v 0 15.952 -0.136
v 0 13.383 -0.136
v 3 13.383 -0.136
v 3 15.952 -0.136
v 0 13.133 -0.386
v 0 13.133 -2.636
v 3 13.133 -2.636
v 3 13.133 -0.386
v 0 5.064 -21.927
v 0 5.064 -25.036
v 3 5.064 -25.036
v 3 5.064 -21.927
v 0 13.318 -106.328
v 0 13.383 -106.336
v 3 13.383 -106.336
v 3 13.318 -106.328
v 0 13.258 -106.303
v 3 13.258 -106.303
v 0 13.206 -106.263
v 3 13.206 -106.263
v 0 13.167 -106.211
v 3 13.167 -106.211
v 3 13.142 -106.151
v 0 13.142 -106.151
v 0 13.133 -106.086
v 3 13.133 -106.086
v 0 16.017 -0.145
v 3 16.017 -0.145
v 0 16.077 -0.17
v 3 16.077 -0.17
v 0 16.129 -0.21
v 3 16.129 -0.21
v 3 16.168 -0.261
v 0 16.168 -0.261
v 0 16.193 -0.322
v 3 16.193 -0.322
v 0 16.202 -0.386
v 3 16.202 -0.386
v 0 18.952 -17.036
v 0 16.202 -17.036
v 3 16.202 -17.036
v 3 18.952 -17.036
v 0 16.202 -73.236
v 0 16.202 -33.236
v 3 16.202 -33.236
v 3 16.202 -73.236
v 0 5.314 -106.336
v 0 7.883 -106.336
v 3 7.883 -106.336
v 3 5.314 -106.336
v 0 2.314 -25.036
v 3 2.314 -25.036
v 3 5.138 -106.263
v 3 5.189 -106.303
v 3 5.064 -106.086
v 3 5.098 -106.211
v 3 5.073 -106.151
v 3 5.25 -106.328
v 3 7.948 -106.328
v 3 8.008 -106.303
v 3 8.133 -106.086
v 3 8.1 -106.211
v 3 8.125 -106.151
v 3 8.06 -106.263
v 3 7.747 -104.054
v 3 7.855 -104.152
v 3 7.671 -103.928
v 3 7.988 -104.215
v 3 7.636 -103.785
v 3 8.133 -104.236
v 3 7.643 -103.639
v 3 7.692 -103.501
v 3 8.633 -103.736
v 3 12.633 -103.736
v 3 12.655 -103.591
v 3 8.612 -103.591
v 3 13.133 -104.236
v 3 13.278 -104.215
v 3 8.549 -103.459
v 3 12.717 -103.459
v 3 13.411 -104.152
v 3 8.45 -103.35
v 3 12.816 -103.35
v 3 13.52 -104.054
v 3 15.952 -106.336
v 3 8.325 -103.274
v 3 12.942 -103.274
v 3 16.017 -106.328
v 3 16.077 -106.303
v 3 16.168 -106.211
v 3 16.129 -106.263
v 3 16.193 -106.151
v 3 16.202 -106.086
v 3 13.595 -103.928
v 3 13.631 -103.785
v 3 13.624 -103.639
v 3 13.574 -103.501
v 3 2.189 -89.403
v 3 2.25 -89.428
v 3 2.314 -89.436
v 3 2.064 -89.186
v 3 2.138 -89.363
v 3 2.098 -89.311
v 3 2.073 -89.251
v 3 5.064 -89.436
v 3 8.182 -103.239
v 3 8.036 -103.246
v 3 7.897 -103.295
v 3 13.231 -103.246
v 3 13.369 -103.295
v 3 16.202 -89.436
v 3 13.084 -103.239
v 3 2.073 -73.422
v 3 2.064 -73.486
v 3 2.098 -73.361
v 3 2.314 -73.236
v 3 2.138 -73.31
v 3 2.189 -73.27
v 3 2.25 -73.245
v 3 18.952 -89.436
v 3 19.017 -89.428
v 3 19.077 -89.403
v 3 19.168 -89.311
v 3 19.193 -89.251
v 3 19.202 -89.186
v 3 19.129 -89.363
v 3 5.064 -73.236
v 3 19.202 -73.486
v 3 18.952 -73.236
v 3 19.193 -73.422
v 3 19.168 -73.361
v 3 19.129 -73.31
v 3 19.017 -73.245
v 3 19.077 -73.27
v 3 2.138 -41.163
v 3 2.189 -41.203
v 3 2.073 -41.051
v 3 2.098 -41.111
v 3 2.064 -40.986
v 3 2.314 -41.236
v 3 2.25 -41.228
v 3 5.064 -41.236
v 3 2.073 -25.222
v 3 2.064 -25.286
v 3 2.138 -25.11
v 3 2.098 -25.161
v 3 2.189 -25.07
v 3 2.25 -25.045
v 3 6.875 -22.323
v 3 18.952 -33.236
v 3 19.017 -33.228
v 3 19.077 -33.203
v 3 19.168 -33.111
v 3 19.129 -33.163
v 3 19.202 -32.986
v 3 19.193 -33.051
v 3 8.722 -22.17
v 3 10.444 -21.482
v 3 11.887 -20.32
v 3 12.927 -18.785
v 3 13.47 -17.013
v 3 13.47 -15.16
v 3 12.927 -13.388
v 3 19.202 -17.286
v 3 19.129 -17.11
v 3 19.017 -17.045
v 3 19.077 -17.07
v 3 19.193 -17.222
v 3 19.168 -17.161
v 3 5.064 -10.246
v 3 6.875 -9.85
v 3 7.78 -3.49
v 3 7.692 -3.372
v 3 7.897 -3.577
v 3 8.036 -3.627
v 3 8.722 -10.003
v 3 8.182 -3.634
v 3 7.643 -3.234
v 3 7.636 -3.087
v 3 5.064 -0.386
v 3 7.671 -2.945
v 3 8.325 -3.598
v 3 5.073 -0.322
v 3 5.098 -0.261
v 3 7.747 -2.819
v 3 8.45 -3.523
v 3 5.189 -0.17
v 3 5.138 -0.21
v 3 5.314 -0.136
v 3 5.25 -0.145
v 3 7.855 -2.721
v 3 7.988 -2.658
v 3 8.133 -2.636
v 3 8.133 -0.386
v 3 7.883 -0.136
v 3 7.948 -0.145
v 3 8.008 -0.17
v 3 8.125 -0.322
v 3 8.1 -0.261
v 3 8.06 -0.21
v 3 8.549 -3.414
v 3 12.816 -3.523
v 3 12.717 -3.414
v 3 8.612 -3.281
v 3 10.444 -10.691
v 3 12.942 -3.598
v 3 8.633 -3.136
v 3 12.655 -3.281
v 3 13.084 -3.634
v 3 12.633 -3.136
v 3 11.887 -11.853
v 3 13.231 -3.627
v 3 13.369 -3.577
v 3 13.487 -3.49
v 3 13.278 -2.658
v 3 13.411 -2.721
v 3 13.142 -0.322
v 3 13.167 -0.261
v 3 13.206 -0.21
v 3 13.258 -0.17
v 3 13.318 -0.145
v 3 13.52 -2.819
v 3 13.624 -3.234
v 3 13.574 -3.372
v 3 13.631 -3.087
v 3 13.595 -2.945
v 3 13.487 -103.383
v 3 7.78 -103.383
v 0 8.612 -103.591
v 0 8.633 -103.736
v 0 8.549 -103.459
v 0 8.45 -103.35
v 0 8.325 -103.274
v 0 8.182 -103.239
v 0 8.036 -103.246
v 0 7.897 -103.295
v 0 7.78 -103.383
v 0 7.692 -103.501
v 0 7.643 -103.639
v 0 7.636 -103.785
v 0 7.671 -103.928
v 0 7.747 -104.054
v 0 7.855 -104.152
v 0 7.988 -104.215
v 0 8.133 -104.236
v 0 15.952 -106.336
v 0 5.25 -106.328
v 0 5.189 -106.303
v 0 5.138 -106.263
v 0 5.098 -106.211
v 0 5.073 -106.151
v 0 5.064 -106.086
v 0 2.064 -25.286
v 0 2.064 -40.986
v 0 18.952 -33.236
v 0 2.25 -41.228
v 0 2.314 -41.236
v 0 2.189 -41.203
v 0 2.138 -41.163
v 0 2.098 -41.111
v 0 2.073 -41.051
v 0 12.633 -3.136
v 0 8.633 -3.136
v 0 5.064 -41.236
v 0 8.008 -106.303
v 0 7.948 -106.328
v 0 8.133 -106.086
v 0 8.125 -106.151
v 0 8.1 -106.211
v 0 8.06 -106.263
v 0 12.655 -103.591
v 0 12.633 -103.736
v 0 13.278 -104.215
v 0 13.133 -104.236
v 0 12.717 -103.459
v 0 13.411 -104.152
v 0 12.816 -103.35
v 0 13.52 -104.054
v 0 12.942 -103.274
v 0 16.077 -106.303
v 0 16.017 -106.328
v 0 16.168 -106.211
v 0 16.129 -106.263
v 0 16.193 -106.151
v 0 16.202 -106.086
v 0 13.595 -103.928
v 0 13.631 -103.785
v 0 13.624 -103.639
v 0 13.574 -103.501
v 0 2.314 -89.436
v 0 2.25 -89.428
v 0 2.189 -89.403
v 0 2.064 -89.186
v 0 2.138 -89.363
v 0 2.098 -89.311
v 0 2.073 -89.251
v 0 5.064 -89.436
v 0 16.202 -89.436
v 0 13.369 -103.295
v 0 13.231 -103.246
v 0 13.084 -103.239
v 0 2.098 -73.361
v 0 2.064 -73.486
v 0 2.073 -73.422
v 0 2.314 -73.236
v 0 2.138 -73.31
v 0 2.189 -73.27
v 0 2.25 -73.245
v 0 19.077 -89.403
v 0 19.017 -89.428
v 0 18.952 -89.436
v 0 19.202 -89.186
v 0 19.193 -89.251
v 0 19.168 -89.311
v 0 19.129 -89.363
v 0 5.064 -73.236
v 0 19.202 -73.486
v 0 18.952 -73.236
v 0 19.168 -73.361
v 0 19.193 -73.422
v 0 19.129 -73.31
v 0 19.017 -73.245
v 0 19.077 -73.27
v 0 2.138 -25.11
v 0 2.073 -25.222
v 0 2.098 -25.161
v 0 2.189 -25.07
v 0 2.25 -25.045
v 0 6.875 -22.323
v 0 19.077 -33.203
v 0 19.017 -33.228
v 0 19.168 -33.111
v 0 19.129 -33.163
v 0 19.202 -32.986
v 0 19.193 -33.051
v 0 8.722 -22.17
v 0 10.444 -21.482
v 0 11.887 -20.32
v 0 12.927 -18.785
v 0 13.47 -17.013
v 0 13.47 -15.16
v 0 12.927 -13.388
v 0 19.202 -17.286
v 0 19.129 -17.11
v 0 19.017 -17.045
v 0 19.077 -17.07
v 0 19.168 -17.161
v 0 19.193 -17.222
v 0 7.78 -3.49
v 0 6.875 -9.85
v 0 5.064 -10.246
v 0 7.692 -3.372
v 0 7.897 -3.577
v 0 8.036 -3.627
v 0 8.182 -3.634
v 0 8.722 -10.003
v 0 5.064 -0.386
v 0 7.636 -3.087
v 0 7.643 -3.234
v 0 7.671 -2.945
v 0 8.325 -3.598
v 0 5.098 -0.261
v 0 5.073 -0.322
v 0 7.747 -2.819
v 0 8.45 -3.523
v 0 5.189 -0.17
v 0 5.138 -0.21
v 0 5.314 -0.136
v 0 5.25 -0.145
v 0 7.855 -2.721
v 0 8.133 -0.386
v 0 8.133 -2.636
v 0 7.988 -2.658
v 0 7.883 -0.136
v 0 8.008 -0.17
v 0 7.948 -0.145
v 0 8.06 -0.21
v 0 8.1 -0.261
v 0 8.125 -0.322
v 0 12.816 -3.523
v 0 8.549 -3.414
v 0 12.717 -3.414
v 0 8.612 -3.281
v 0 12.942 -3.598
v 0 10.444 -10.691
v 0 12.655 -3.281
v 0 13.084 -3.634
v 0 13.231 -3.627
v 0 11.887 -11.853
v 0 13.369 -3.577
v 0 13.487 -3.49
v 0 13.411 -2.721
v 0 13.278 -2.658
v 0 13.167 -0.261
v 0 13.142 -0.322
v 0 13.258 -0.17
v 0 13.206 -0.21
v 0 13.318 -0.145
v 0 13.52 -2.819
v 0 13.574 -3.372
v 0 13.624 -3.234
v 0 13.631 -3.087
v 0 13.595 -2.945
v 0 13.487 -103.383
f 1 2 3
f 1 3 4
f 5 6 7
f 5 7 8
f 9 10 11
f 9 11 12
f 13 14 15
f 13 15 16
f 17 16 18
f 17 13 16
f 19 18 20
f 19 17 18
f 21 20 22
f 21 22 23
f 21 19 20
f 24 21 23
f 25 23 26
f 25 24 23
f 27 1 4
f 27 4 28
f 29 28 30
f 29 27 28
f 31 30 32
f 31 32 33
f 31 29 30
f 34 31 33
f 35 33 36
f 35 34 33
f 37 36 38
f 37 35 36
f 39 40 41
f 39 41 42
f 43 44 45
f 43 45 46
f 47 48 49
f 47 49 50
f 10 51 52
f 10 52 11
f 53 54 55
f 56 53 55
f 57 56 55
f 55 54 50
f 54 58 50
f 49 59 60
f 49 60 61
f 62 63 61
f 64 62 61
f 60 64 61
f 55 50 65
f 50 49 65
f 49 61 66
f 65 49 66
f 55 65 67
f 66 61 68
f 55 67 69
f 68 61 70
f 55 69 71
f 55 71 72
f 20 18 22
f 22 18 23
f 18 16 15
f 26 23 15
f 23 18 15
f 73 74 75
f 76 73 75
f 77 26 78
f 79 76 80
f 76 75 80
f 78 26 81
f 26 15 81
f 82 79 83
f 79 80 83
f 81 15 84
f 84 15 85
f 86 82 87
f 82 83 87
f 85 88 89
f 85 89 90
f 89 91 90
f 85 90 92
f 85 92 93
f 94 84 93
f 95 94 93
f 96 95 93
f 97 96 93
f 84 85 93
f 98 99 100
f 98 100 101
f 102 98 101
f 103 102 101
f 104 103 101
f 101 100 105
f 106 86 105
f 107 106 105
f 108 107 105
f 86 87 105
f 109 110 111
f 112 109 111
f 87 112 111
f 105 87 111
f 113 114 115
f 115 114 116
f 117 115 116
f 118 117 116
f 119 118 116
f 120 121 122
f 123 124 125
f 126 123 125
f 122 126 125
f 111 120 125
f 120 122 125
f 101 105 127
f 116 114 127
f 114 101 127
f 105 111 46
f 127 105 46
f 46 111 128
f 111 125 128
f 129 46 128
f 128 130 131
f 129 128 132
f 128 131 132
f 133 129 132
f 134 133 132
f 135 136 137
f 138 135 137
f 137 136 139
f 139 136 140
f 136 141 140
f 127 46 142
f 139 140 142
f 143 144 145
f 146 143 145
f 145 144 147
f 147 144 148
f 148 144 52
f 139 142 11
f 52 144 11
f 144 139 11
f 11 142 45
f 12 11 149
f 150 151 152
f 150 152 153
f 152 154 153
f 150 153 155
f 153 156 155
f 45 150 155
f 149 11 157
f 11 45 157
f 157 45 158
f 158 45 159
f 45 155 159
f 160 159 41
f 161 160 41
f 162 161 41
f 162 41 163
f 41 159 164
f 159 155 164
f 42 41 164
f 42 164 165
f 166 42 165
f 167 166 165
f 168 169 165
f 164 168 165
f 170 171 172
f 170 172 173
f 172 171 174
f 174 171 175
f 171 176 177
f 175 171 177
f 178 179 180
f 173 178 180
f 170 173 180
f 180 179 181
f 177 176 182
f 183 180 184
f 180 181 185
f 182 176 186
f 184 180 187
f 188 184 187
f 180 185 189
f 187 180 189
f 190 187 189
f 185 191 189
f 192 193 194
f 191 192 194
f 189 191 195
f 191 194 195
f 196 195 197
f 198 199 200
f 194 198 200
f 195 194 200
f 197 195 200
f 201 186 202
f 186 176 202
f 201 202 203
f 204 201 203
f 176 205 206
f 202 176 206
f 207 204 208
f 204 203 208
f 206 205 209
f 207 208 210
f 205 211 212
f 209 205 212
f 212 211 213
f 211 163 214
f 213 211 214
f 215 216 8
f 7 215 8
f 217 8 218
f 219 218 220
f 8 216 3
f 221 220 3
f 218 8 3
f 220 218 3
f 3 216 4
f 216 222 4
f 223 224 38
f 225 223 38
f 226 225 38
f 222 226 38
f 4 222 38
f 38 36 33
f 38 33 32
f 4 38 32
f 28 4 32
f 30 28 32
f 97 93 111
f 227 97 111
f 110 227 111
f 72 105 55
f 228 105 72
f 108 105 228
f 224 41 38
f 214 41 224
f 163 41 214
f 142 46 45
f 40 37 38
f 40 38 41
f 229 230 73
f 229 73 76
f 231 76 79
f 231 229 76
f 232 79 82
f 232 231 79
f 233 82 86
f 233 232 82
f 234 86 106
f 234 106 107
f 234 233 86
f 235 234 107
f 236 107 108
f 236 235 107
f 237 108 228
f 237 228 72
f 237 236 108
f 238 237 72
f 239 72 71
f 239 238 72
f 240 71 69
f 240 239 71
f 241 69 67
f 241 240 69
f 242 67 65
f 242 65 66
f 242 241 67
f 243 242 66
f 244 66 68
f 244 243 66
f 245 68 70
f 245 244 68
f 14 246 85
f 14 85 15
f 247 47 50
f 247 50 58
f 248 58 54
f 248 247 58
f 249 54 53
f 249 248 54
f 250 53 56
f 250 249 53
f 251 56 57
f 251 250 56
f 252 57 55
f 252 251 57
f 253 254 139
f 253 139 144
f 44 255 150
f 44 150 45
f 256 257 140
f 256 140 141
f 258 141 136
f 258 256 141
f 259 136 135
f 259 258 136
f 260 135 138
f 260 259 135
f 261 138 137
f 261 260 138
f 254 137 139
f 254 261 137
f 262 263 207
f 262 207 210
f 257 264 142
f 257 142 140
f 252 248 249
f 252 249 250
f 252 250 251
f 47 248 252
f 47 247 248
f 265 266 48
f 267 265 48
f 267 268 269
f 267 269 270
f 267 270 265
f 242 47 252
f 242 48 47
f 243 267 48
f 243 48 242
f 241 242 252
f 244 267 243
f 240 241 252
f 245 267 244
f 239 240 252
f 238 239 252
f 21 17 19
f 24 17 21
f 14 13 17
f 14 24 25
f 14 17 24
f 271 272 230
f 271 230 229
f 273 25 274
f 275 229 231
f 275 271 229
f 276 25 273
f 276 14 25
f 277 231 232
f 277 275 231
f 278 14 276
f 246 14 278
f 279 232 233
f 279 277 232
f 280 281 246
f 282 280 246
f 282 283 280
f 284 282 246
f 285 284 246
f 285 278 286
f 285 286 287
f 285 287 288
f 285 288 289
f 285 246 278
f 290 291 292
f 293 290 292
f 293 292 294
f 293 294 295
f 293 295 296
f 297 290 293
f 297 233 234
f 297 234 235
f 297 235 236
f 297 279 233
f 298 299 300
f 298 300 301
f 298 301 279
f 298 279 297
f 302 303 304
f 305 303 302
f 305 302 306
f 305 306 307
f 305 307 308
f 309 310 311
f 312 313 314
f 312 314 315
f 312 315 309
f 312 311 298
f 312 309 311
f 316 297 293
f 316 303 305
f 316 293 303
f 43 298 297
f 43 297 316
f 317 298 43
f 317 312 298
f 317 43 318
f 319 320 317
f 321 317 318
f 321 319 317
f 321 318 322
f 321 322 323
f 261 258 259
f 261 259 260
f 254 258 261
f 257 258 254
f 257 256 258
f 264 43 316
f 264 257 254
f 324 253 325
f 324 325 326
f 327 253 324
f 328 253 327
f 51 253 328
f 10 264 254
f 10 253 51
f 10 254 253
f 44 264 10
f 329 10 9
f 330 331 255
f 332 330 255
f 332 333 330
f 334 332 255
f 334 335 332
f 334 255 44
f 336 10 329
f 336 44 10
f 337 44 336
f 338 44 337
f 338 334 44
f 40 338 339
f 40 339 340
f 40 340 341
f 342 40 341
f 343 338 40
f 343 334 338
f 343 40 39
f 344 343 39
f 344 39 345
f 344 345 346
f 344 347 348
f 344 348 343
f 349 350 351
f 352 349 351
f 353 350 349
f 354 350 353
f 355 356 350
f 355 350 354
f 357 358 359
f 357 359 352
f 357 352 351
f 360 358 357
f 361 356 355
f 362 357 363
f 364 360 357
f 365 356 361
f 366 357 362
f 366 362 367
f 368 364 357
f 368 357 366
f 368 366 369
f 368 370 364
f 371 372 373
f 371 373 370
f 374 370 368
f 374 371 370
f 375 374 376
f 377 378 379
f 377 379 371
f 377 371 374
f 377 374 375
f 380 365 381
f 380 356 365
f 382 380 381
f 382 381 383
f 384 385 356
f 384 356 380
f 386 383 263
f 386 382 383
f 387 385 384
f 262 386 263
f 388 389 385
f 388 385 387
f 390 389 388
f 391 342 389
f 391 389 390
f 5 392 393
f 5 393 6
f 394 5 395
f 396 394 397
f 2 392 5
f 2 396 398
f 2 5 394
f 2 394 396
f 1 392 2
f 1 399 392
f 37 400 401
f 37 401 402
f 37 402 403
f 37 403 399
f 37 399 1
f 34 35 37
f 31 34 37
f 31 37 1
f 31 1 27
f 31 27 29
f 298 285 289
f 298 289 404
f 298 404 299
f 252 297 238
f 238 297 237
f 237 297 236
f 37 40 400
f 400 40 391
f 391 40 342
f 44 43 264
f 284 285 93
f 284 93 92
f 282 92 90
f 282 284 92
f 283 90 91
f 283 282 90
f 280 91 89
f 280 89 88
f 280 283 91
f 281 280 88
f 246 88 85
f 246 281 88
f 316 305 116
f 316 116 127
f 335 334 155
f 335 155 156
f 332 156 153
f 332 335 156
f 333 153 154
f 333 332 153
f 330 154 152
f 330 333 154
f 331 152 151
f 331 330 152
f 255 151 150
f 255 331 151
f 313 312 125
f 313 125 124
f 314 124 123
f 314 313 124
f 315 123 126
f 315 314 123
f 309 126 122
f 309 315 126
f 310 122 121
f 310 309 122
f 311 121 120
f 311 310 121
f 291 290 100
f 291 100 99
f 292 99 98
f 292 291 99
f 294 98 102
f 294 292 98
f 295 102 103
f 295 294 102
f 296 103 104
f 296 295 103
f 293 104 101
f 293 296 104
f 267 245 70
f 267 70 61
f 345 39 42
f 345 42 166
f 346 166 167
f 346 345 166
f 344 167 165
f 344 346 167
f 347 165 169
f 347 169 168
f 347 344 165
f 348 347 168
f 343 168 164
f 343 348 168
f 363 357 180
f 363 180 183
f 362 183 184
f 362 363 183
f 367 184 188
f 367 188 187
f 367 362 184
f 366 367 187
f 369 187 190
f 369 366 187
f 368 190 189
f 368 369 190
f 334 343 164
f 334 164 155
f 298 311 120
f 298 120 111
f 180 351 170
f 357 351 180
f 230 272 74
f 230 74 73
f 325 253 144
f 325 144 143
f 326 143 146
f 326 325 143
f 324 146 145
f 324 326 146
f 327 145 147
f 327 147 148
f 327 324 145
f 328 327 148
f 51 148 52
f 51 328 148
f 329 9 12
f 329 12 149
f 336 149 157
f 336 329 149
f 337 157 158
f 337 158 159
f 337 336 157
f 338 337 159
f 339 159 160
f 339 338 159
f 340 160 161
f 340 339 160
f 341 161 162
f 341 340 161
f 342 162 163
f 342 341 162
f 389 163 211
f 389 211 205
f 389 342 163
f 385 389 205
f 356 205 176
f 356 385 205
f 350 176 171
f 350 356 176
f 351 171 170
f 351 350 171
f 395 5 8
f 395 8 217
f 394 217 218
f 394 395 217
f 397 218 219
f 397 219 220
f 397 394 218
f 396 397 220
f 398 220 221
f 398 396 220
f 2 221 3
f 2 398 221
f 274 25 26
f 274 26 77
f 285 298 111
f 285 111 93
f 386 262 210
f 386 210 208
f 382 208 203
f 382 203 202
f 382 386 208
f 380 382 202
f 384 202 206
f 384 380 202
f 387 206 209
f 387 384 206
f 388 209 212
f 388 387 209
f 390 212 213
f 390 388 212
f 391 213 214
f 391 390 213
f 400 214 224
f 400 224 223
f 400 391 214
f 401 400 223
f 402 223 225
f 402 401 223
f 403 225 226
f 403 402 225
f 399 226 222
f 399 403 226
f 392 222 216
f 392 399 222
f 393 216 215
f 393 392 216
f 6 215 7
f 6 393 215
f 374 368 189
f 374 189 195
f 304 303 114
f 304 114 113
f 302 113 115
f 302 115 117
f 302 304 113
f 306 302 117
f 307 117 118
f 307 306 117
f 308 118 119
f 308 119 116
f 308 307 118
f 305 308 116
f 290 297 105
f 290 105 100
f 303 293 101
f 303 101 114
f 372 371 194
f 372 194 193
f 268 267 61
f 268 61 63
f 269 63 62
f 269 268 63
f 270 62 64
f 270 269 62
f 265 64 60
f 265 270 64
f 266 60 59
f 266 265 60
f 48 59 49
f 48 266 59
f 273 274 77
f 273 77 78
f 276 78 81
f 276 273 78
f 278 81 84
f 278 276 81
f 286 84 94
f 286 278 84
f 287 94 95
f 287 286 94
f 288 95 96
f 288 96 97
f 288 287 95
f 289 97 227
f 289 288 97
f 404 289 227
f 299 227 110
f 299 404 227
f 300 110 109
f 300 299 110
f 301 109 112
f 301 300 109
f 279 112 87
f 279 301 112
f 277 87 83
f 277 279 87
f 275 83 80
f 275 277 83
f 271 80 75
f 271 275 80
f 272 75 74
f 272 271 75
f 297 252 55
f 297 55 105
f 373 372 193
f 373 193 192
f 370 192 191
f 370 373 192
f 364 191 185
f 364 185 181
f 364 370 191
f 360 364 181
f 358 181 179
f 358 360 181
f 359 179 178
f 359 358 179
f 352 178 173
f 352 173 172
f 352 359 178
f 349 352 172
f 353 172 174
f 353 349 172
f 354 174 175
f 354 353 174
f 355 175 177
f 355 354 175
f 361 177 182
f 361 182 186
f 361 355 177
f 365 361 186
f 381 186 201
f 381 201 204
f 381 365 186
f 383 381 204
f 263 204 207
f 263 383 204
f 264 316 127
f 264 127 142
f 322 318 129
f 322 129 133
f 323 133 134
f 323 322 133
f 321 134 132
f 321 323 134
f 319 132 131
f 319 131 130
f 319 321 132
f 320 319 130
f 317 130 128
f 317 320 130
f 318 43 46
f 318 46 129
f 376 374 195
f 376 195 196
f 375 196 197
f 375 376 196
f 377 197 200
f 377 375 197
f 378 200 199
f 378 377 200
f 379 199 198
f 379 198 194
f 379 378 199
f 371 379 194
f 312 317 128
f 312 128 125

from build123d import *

# Parameters (mm, degrees)
BOSS_EXTRUDE1_DEPTH = 3


with BuildPart() as part:
    # Sketch3 → Boss-Extrude1 (new body)
    with BuildSketch(Plane(origin=(0, 0, 0), x_dir=(0, 0, -1), z_dir=(1, 0, 0))):
        with BuildLine():
            Line((73.486325357, 19.201934502), (89.186325357, 19.201934502))
            ThreePointArc((89.186325357, 19.201934502), (89.363102052, 19.128711197), (89.436325357, 18.951934502))
            Line((89.436325357, 18.951934502), (89.436325357, 16.201934502))
            Line((89.436325357, 16.201934502), (106.086325357, 16.201934502))
            ThreePointArc((106.086325357, 16.201934502), (106.263102052, 16.128711197), (106.336325357, 15.951934502))
            Line((106.336325357, 15.951934502), (106.336325357, 13.383184502))
            ThreePointArc((106.336325357, 13.383184502), (106.263102052, 13.206407807), (106.086325357, 13.133184502))
            Line((106.086325357, 13.133184502), (104.236325357, 13.133184502))
            ThreePointArc((104.236325357, 13.133184502), (103.382771966, 13.486737893), (103.736325357, 12.633184502))
            Line((103.736325357, 12.633184502), (103.736325357, 8.633184502))
            ThreePointArc((103.736325357, 8.633184502), (103.382771966, 7.779631112), (104.236325357, 8.133184502))
            Line((104.236325357, 8.133184502), (106.086325357, 8.133184502))
            ThreePointArc((106.086325357, 8.133184502), (106.263102052, 8.059961197), (106.336325357, 7.883184502))
            Line((106.336325357, 7.883184502), (106.336325357, 5.314434502))
            ThreePointArc((106.336325357, 5.314434502), (106.263102052, 5.137657807), (106.086325357, 5.064434502))
            Line((106.086325357, 5.064434502), (89.436325357, 5.064434502))
            Line((89.436325357, 5.064434502), (89.436325357, 2.314434502))
            ThreePointArc((89.436325357, 2.314434502), (89.363102052, 2.137657807), (89.186325357, 2.064434502))
            Line((89.186325357, 2.064434502), (73.486325357, 2.064434502))
            ThreePointArc((73.486325357, 2.064434502), (73.309548661, 2.137657807), (73.236325357, 2.314434502))
            Line((73.236325357, 2.314434502), (73.236325357, 5.064434502))
            Line((73.236325357, 5.064434502), (41.236325357, 5.064434502))
            Line((41.236325357, 5.064434502), (41.236325357, 2.314434502))
            ThreePointArc((41.236325357, 2.314434502), (41.163102052, 2.137657807), (40.986325357, 2.064434502))
            Line((40.986325357, 2.064434502), (25.286325357, 2.064434502))
            ThreePointArc((25.286325357, 2.064434502), (25.109548661, 2.137657807), (25.036325357, 2.314434502))
            Line((25.036325357, 2.314434502), (25.036325357, 5.064434502))
            Line((25.036325357, 5.064434502), (21.926862575, 5.064434502))
            ThreePointArc((21.926862575, 5.064434502), (16.086325357, 13.539434502), (10.245788138, 5.064434502))
            Line((10.245788138, 5.064434502), (0.386325357, 5.064434502))
            ThreePointArc((0.386325357, 5.064434502), (0.209548661, 5.137657807), (0.136325357, 5.314434502))
            Line((0.136325357, 5.314434502), (0.136325357, 7.883184502))
            ThreePointArc((0.136325357, 7.883184502), (0.209548661, 8.059961197), (0.386325357, 8.133184502))
            Line((0.386325357, 8.133184502), (2.636325357, 8.133184502))
            ThreePointArc((2.636325357, 8.133184502), (3.489878747, 7.779631112), (3.136325357, 8.633184502))
            Line((3.136325357, 8.633184502), (3.136325357, 12.633184502))
            ThreePointArc((3.136325357, 12.633184502), (3.489878747, 13.486737893), (2.636325357, 13.133184502))
            Line((2.636325357, 13.133184502), (0.386325357, 13.133184502))
            ThreePointArc((0.386325357, 13.133184502), (0.209548661, 13.206407807), (0.136325357, 13.383184502))
            Line((0.136325357, 13.383184502), (0.136325357, 15.951934502))
            ThreePointArc((0.136325357, 15.951934502), (0.209548661, 16.128711197), (0.386325357, 16.201934502))
            Line((0.386325357, 16.201934502), (17.036325357, 16.201934502))
            Line((17.036325357, 16.201934502), (17.036325357, 18.951934502))
            ThreePointArc((17.036325357, 18.951934502), (17.109548661, 19.128711197), (17.286325357, 19.201934502))
            Line((17.286325357, 19.201934502), (32.986325357, 19.201934502))
            ThreePointArc((32.986325357, 19.201934502), (33.163102052, 19.128711197), (33.236325357, 18.951934502))
            Line((33.236325357, 18.951934502), (33.236325357, 16.201934502))
            Line((33.236325357, 16.201934502), (73.236325357, 16.201934502))
            Line((73.236325357, 16.201934502), (73.236325357, 18.951934502))
            ThreePointArc((73.236325357, 18.951934502), (73.309548661, 19.128711197), (73.486325357, 19.201934502))
        make_face()
    extrude(amount=BOSS_EXTRUDE1_DEPTH)


solid = part.part
